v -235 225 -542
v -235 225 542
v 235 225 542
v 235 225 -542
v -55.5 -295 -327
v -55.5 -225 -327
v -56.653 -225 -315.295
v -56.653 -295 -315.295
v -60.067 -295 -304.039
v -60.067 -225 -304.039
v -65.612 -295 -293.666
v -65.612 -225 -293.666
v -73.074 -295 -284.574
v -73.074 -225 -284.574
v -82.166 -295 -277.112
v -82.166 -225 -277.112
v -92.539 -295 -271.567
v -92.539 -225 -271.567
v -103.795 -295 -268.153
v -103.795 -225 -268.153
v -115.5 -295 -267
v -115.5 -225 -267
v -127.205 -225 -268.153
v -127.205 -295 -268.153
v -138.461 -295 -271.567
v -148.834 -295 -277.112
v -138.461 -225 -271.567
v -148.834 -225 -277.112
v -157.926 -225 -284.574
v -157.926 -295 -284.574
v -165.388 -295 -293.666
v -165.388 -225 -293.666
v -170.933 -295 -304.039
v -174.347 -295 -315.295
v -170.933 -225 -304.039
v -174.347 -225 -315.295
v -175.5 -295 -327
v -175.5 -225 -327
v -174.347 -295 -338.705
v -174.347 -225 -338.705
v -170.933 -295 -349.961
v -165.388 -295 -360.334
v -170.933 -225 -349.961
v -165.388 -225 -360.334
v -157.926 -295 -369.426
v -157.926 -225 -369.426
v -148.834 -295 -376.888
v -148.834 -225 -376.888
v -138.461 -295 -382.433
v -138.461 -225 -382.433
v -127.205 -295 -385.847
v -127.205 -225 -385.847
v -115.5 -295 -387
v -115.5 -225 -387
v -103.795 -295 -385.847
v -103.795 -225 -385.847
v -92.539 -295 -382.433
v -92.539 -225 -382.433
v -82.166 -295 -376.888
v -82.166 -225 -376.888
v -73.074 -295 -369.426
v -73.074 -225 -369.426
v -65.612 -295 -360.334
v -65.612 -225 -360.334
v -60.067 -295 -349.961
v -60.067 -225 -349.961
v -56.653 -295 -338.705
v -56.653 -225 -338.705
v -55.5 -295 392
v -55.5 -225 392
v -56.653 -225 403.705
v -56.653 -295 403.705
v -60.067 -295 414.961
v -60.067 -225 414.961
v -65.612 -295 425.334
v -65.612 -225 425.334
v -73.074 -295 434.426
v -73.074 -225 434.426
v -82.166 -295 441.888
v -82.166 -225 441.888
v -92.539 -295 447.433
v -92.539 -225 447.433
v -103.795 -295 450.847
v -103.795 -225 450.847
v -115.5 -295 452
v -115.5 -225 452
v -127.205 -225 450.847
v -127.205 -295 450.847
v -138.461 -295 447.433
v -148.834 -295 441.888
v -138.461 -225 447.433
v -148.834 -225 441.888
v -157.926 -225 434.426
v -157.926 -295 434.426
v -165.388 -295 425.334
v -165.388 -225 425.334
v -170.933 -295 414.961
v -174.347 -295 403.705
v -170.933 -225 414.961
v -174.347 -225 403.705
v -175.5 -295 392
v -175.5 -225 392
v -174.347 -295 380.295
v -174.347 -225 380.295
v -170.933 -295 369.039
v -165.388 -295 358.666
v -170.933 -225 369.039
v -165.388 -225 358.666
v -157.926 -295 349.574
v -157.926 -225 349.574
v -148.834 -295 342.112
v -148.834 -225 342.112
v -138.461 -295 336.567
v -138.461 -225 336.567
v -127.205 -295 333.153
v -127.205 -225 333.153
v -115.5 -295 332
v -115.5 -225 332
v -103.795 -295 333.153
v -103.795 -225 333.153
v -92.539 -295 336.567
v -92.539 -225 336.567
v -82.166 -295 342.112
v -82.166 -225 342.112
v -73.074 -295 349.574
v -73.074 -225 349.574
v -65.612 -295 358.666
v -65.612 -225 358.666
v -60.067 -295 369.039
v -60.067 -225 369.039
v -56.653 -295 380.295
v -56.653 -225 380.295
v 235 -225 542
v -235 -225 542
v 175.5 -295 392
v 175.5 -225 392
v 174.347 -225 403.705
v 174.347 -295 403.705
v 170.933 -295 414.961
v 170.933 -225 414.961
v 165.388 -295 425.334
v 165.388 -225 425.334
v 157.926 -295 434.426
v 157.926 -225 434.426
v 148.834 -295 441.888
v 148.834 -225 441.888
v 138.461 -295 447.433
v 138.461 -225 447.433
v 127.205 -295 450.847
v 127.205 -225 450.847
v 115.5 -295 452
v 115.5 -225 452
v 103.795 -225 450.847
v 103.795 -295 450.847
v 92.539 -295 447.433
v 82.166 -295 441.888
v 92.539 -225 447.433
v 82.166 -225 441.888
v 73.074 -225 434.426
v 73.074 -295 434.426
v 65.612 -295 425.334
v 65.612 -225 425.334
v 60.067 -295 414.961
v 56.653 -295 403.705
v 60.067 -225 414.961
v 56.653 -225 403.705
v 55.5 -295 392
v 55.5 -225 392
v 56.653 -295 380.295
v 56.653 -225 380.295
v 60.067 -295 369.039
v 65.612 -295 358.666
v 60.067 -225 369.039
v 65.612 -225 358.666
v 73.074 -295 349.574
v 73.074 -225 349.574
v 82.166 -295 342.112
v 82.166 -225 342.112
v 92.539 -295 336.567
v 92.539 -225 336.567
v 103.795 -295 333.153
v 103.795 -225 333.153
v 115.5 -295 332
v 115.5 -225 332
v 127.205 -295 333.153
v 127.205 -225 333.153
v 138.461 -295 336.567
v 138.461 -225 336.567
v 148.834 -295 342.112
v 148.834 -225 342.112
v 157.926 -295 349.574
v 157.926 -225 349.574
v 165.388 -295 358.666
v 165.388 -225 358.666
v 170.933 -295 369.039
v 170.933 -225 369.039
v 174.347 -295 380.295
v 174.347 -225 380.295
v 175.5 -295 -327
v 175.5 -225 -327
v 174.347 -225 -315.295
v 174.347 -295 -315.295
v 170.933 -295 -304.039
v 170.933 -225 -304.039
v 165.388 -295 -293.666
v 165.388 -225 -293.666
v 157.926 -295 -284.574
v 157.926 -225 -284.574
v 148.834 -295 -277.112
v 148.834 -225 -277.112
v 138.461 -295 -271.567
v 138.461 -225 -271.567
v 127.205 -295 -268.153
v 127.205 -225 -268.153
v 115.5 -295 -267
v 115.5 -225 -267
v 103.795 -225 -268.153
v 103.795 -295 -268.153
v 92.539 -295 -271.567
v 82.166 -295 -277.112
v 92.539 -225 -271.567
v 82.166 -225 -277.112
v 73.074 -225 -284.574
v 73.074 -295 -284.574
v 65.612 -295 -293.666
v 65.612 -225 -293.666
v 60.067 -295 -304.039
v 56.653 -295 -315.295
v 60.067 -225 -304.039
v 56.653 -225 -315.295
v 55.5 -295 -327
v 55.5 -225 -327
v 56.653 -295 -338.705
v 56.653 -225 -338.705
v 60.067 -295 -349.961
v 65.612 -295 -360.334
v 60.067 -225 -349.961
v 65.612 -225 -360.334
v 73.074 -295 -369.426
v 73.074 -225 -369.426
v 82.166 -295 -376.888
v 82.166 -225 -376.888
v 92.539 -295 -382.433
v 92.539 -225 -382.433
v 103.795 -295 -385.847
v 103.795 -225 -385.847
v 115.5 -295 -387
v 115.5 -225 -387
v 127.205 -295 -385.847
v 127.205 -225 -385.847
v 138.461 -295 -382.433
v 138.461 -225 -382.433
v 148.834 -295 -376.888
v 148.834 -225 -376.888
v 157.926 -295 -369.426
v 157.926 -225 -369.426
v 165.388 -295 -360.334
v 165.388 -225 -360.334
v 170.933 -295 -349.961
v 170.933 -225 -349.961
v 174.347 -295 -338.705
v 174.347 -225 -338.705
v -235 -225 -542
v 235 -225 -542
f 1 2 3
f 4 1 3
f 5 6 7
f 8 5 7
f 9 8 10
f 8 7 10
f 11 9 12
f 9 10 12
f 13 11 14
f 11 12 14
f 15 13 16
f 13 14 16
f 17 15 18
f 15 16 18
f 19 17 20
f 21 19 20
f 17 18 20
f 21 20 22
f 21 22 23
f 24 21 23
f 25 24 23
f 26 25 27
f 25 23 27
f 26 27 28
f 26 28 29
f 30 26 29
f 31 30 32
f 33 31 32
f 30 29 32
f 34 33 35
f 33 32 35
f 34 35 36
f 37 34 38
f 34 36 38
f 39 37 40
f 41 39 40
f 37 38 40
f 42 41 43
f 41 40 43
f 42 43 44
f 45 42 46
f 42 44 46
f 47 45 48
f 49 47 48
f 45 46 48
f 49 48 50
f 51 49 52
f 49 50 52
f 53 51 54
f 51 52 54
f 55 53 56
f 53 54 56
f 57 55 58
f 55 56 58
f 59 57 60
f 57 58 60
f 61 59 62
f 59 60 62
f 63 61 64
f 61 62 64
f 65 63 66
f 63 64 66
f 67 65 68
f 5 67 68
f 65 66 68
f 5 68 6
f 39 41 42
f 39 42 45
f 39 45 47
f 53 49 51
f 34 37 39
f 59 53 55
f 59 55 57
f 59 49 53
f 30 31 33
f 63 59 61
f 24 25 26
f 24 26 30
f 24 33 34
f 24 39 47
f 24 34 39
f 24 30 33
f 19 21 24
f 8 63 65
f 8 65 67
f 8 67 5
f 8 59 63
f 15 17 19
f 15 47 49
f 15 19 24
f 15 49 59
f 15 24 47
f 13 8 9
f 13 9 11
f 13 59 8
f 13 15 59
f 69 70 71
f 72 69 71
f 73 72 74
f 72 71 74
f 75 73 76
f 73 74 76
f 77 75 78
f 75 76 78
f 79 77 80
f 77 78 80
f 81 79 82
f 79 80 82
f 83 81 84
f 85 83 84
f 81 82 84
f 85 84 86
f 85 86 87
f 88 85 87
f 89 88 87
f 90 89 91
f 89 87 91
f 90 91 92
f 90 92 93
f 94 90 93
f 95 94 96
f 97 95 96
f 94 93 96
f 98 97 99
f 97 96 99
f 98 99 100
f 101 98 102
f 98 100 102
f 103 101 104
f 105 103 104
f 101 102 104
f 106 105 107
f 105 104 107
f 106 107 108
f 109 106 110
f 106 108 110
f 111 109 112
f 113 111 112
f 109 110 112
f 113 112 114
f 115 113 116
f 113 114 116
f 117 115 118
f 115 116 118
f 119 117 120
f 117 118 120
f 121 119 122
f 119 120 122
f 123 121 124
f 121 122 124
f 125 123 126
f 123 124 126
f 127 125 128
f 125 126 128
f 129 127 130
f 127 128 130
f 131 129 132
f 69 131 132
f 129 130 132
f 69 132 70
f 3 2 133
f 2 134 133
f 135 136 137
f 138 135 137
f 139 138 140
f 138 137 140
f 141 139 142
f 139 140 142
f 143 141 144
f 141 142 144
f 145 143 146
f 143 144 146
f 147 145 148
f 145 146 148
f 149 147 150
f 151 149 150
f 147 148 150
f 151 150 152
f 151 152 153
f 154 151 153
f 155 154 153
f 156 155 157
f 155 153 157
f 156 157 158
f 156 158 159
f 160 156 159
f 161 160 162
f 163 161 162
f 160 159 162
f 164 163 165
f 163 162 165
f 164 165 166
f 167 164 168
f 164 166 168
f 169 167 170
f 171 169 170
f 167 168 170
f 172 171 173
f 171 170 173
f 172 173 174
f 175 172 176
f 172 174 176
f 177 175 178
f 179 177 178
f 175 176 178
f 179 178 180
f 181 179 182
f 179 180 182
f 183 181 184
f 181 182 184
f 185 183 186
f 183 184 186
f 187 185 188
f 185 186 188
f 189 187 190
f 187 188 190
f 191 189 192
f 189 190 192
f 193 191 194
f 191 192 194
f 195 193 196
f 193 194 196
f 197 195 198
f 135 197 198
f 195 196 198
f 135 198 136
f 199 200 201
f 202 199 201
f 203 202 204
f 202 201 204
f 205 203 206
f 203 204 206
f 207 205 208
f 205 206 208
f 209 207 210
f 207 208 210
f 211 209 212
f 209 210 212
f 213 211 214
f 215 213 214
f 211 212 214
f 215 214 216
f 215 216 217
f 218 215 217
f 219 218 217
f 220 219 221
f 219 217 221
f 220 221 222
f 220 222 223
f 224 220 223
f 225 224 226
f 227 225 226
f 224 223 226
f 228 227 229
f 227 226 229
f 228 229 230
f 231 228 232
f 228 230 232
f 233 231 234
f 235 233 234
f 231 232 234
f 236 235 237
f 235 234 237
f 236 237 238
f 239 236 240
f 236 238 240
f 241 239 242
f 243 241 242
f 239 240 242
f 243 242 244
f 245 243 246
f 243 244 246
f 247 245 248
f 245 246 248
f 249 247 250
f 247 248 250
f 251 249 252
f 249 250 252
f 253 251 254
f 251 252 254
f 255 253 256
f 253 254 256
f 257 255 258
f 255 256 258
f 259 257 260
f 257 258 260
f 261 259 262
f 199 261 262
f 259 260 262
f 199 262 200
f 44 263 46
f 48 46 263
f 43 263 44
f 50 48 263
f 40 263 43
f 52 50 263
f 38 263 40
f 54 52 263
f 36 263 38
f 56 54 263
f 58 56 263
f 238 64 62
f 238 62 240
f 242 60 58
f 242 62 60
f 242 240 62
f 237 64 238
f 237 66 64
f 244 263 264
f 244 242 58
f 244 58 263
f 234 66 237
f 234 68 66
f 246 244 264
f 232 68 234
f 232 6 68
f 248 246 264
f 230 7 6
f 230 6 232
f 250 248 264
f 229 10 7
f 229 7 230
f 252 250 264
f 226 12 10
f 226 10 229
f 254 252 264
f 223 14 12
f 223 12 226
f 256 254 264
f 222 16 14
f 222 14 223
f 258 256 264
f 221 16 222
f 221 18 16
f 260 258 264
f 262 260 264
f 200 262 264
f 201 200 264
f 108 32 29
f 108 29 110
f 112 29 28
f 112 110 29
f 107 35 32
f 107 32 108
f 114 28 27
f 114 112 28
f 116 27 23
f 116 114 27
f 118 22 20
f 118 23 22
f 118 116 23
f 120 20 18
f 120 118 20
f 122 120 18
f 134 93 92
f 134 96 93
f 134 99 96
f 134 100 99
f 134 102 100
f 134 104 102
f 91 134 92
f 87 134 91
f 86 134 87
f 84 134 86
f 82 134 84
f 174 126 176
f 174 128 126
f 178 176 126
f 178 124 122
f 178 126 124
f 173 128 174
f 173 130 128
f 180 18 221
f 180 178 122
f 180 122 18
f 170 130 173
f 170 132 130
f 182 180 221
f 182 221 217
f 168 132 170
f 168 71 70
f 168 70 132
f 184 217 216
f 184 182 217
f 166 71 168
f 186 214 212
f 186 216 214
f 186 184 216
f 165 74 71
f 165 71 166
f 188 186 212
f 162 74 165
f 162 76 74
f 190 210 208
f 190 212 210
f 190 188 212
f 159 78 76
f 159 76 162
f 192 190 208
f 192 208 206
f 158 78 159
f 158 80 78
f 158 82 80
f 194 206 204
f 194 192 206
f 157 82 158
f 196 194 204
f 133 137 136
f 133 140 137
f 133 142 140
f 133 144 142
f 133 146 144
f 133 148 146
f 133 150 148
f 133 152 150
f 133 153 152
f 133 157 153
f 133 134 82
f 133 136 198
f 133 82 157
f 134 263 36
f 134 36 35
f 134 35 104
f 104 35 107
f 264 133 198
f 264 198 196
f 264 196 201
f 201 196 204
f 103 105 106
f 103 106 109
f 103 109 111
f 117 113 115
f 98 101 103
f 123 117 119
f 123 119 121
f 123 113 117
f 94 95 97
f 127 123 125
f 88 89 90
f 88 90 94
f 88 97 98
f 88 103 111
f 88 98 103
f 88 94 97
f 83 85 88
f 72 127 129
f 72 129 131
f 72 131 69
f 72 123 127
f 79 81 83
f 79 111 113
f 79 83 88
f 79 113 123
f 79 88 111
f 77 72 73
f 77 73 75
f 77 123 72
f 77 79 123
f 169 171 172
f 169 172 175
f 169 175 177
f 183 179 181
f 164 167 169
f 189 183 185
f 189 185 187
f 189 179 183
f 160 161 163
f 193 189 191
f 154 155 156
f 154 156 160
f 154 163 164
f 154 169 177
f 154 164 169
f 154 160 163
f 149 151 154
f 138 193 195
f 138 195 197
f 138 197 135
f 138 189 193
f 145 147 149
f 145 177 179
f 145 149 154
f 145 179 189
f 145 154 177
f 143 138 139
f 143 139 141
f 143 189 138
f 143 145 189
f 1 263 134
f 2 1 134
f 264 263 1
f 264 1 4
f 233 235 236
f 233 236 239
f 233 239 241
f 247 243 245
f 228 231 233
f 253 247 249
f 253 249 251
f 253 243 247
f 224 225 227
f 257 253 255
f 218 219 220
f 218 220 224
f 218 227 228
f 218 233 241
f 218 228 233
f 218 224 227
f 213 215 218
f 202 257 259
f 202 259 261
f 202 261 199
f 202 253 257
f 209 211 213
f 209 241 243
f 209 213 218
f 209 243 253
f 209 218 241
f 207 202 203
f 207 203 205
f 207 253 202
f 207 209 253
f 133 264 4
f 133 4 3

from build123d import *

# Parameters (mm, degrees)
F0_W     = 470
F0_H     = 1084
F1_DEPTH = 225
F2_R     = 60
F3_DEPTH = 70


with BuildPart() as f1:
    # F0 (on Front) → F1 (new body, symmetric)
    with BuildSketch(Plane.XZ):
        Rectangle(F0_W, F0_H)
    extrude(amount=F1_DEPTH, both=True)

    # F2 (on face) → F3 (join)
    with BuildSketch(Plane.XZ.offset(225)):
        with Locations((-115.5, 392)):
            Circle(F2_R)
        with Locations((-115.5, -327)):
            Circle(F2_R)
        with Locations((115.5, 392)):
            Circle(F2_R)
        with Locations((115.5, -327)):
            Circle(F2_R)
    extrude(amount=F3_DEPTH)


solid = f1.part
